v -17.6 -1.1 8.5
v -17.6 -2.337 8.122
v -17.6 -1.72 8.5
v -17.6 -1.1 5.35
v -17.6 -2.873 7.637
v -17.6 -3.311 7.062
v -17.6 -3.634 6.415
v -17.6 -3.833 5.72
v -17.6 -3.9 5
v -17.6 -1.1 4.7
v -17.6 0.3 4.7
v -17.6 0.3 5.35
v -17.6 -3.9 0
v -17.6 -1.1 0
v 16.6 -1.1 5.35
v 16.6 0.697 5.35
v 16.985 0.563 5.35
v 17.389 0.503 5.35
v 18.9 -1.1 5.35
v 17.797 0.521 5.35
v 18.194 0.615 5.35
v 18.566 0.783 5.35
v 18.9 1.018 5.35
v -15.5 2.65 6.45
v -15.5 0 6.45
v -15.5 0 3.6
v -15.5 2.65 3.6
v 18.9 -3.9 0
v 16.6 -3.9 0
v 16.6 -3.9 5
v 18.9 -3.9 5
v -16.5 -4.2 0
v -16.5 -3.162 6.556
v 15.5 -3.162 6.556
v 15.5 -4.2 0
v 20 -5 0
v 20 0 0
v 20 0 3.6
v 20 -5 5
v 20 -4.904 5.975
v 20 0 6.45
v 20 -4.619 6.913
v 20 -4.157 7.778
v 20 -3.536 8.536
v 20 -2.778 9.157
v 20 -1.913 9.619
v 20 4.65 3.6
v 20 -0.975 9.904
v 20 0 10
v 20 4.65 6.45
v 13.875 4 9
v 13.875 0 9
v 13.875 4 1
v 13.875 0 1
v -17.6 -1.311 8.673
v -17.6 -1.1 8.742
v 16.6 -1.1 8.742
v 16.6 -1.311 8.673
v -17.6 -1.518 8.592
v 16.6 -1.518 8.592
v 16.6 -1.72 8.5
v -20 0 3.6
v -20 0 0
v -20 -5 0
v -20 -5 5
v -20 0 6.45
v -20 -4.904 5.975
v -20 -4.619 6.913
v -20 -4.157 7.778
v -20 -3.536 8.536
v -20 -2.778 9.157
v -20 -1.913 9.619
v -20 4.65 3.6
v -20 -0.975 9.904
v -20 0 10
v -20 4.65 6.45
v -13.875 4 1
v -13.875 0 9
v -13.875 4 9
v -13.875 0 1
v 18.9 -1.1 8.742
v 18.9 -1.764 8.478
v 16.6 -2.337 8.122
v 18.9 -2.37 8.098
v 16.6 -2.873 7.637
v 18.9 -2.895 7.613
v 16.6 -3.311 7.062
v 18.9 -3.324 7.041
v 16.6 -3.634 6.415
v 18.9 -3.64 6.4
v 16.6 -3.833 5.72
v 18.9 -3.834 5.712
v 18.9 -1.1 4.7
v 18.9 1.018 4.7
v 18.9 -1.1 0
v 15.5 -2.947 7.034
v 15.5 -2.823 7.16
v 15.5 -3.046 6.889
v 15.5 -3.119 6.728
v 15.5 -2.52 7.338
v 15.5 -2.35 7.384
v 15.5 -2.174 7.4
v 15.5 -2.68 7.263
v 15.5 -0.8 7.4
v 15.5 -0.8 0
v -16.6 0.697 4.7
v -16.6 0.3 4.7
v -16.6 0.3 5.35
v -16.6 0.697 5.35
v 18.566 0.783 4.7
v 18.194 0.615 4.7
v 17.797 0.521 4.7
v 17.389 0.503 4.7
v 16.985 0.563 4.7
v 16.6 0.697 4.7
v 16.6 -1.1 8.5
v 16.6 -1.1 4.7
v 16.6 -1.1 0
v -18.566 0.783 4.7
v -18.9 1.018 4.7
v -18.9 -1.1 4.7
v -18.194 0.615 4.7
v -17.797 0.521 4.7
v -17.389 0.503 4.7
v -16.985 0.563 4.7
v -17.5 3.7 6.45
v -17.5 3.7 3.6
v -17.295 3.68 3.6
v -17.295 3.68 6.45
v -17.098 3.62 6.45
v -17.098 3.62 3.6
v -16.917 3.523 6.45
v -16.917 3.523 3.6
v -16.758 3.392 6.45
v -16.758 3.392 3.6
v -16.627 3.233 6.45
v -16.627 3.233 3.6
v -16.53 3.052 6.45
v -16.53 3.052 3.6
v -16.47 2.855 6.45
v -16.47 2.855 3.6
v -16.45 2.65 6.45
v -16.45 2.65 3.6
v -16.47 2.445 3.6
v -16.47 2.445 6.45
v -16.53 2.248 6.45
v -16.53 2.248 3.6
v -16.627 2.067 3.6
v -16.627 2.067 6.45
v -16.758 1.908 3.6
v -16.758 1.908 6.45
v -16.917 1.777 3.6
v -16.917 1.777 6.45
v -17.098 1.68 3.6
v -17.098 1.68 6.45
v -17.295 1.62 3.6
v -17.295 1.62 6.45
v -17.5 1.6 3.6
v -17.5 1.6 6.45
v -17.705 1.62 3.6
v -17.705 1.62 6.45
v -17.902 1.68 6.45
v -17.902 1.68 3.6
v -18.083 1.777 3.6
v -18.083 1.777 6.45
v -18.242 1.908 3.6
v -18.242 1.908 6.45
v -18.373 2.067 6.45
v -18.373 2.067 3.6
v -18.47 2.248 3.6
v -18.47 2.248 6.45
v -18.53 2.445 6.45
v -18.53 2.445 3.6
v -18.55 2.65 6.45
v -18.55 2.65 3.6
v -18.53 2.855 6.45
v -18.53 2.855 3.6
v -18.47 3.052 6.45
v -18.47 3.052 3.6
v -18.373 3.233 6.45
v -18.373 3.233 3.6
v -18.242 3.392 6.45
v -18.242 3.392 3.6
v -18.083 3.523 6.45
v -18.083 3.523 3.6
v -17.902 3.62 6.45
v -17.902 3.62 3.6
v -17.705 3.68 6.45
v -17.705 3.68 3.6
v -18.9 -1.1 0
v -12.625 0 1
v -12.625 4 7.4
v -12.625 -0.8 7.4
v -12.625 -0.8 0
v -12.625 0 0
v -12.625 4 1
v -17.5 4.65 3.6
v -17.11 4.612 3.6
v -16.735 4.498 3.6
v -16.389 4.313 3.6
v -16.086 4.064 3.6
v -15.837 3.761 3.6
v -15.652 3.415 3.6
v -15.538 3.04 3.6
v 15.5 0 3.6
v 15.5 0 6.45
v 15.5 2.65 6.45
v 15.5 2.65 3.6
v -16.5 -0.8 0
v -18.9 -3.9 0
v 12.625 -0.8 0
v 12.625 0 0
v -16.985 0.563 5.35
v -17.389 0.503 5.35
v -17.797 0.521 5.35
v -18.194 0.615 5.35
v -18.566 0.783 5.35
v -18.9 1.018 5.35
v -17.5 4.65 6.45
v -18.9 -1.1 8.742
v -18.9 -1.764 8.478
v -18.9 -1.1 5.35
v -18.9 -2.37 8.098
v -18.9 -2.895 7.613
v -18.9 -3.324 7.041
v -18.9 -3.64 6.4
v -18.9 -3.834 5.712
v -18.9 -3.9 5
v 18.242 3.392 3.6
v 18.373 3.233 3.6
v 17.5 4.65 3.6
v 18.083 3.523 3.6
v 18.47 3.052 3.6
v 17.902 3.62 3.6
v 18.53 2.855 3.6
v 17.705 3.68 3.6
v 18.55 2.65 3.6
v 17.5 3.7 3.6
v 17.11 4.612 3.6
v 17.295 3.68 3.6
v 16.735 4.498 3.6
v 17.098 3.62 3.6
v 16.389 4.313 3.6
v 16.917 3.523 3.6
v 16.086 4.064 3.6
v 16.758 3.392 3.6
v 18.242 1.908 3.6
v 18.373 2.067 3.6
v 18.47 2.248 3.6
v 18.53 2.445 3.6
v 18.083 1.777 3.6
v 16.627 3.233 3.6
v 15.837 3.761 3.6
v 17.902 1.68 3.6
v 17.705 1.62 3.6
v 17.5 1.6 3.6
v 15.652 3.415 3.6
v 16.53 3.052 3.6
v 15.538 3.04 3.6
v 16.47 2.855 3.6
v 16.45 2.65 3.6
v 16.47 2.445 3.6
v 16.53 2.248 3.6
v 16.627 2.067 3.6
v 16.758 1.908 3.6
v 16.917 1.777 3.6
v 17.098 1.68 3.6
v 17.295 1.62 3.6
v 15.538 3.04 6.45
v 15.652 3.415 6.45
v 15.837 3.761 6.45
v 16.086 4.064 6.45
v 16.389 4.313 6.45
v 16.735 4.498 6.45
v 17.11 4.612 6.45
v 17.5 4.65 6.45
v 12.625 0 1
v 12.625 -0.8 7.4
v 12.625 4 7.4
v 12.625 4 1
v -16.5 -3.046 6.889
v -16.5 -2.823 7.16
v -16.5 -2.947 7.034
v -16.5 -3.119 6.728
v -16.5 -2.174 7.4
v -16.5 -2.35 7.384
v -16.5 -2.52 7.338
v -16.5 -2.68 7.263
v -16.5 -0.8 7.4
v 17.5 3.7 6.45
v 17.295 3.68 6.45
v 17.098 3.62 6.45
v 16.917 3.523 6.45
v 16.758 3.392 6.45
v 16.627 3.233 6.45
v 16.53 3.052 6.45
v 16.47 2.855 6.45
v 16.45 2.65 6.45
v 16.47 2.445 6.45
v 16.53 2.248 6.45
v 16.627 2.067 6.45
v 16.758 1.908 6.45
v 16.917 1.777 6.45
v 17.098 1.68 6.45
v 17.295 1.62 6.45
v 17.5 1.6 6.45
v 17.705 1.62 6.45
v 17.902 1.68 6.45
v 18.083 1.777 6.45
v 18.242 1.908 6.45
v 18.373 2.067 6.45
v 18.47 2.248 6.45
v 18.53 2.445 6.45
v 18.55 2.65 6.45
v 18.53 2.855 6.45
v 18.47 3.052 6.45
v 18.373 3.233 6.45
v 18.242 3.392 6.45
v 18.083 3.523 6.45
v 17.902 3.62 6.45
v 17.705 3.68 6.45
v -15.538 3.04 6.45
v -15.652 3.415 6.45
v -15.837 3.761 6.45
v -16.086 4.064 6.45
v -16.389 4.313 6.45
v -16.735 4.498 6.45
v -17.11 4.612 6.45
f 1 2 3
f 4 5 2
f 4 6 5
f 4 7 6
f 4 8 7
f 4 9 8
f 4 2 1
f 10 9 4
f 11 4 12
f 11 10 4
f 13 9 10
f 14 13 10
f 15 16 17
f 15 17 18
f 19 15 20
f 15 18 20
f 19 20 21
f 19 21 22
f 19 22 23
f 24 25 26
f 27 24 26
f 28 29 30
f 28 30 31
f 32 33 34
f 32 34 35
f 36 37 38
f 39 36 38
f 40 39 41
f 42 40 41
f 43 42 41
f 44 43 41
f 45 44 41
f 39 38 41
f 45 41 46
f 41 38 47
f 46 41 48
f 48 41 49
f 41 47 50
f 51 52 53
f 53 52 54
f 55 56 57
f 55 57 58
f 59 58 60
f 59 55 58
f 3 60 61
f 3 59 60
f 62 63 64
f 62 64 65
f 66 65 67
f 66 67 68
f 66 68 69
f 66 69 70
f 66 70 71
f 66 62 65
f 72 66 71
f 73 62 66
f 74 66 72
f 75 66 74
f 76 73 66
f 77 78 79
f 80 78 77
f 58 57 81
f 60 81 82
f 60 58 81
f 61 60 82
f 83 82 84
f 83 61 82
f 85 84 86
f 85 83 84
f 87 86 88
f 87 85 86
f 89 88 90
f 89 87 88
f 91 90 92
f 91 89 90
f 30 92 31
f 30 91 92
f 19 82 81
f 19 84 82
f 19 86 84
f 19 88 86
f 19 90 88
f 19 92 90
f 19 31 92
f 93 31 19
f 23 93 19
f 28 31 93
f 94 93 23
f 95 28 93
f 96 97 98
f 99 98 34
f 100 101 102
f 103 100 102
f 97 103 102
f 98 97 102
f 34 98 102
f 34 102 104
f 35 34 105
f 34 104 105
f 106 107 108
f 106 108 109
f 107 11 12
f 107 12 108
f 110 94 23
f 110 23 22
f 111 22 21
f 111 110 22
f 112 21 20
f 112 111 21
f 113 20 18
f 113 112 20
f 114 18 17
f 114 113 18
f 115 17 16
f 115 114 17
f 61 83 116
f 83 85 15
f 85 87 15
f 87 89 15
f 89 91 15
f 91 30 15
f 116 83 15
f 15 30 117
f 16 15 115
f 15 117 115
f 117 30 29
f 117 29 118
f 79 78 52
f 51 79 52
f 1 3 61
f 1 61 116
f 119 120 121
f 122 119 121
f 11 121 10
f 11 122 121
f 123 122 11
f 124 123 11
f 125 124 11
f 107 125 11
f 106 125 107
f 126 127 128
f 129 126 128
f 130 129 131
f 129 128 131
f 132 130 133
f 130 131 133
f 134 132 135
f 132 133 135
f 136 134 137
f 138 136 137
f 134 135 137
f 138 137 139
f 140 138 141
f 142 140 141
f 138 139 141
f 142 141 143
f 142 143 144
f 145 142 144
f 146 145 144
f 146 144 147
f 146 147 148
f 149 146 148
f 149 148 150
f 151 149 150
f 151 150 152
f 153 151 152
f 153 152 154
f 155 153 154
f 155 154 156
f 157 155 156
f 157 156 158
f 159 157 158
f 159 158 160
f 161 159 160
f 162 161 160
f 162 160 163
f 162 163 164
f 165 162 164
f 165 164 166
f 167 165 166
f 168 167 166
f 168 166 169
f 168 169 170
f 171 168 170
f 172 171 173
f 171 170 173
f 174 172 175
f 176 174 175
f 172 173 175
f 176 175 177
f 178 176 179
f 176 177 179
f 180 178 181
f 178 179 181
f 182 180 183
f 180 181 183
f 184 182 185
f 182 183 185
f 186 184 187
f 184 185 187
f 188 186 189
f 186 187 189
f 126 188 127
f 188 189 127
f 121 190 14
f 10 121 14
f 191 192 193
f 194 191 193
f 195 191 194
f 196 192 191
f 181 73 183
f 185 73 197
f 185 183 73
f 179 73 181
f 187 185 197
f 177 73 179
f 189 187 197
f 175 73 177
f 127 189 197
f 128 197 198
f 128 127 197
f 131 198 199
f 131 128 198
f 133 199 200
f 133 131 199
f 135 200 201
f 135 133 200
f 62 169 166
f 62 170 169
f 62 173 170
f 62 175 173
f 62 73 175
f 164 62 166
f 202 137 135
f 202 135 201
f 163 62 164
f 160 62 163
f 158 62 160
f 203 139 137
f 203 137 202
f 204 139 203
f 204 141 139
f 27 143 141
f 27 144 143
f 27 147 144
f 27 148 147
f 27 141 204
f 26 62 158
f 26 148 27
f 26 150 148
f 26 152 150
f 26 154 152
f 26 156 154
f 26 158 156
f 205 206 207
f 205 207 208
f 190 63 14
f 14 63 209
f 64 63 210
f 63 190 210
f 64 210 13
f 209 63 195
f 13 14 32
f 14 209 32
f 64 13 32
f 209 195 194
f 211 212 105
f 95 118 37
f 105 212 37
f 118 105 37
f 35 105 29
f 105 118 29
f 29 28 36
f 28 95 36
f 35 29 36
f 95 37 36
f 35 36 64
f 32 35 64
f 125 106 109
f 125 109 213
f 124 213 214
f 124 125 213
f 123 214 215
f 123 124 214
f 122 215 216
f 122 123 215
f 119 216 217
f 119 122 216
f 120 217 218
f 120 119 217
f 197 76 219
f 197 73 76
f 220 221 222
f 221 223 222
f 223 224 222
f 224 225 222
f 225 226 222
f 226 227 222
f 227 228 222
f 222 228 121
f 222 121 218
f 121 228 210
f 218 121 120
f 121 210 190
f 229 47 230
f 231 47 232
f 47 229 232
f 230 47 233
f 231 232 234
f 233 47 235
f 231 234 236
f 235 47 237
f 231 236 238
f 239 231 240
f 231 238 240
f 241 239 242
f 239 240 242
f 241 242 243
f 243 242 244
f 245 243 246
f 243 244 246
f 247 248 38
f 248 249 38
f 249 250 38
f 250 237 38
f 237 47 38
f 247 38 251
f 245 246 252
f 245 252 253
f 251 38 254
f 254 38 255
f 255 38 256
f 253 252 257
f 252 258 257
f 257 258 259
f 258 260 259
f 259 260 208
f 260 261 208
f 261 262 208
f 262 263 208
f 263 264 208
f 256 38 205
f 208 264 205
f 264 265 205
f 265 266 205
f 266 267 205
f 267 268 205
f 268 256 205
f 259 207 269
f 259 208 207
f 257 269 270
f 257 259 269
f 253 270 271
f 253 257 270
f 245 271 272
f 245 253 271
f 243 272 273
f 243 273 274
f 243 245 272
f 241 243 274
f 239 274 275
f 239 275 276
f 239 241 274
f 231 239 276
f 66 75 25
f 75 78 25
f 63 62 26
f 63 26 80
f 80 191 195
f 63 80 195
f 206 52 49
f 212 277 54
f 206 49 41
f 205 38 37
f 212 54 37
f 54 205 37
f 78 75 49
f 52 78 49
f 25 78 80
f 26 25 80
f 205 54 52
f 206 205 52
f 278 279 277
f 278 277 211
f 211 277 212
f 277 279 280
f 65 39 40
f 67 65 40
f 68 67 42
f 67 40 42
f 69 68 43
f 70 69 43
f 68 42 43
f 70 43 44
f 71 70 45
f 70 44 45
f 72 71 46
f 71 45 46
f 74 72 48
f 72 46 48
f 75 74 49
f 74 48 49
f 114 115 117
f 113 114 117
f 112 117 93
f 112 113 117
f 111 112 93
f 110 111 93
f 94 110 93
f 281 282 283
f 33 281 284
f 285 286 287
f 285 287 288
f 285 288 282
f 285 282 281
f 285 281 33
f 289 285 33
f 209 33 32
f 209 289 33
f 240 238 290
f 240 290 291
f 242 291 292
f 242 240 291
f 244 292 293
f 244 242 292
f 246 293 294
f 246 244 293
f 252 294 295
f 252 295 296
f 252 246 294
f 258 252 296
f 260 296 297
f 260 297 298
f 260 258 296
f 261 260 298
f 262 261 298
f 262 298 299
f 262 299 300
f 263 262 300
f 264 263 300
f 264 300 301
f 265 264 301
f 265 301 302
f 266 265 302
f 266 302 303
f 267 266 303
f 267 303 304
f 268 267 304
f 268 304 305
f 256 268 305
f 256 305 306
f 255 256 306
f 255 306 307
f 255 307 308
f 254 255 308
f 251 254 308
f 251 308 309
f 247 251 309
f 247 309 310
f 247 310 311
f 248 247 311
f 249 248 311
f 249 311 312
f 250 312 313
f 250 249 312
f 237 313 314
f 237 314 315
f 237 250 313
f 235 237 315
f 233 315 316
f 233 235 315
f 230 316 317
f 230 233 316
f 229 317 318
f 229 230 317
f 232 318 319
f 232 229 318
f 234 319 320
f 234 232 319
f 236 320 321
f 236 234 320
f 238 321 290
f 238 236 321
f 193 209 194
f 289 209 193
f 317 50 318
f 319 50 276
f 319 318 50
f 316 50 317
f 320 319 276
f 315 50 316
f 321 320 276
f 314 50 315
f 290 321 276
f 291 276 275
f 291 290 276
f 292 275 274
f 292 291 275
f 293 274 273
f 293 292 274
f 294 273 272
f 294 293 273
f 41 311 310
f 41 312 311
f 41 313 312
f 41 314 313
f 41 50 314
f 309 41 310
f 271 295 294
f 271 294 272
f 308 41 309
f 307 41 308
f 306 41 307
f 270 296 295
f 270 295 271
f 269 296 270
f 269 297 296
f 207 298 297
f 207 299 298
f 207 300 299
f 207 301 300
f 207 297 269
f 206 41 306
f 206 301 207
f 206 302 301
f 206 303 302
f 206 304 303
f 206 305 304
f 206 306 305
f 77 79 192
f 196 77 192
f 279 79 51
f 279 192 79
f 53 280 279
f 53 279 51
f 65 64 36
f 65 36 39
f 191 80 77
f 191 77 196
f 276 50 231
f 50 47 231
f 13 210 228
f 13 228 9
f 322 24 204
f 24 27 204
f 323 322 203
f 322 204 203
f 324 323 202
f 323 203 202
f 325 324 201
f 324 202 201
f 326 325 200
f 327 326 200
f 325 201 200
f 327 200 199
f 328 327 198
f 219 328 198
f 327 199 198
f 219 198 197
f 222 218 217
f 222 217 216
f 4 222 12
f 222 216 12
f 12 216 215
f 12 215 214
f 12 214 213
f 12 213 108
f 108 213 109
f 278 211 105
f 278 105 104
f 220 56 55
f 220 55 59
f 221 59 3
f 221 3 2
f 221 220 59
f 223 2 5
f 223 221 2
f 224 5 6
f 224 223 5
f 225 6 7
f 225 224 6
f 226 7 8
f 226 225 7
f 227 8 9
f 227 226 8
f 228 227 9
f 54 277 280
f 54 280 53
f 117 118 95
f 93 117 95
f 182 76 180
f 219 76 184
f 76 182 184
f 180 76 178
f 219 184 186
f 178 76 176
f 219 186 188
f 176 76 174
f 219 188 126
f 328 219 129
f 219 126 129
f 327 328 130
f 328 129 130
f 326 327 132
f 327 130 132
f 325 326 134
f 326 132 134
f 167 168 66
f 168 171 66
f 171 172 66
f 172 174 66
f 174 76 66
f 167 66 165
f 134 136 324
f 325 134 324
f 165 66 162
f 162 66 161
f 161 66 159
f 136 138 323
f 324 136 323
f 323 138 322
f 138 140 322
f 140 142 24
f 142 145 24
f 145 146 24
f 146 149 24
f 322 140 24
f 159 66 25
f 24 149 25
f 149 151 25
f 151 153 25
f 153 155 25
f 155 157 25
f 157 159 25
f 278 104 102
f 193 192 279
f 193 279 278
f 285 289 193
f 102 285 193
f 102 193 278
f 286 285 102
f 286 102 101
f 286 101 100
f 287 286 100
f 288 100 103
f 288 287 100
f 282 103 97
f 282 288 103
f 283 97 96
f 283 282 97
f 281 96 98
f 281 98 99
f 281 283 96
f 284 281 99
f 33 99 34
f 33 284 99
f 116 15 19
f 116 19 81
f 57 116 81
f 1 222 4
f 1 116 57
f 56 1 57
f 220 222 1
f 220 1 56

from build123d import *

# Parameters (mm, degrees)
BOSS_EXTRUDE1_DEPTH     = 20
SKETCH2_W               = 27.75
SKETCH2_H               = 8
BOSS_EXTRUDE2_DEPTH     = 4
CUT_EXTRUDE1_DEPTH      = 12.625
CUT_EXTRUDE1_DEPTH_BACK = 12.625
SKETCH6_W               = 4.5
SKETCH6_H               = 2.85
BOSS_EXTRUDE3_DEPTH     = 4.65
FILLET1_R               = 2
CUT_EXTRUDE2_REACH      = 23.586
SKETCH7_R               = 1.05
FILLET1_OF_MIRROR1_R    = 2
CUT_EXTRUDE3_START      = -16.5
CUT_EXTRUDE3_DEPTH      = 32
SHELL1_OUTLINE_W        = 2.3
SHELL1_OUTLINE_H        = 2.8
SHELL1_OUTLINE_W_2      = 1.3
SHELL1_DEPTH            = 5
SHELL1_START            = 4.7
SHELL1_2_DEPTH          = 0.65
SHELL1_START_2          = 16.6
SHELL1_3_DEPTH          = 2.3
SHELL1_START_3          = -18.9
SHELL1_4_DEPTH          = 1.3
SHELL1_START_4          = -17.6
SHELL1_5_DEPTH          = 34.2


with BuildPart() as part:
    # Sketch1 → Boss-Extrude1 (new, symmetric)
    with BuildSketch(Plane(origin=(0, 0, 0), x_dir=(0, 0, -1), z_dir=(1, 0, 0))):
        with BuildLine():
            Line((-10, 0), (0, 0))
            Line((0, 0), (0, -5))
            Line((0, -5), (-5, -5))
            ThreePointArc((-5, -5), (-8.535533906, -3.535533906), (-10, 0))
        make_face()
    extrude(amount=BOSS_EXTRUDE1_DEPTH, both=True)

    # Sketch2 → Boss-Extrude2 (add)
    with BuildSketch(Plane(origin=(0, 0, 0), x_dir=(1, 0, 0), z_dir=(0, 1, 0))):
        with Locations((0, -5)):
            Rectangle(SKETCH2_W, SKETCH2_H)
    extrude(amount=BOSS_EXTRUDE2_DEPTH)

    # Sketch4 → Cut-Extrude1 (cut, two sides: drawn at the far end of the back side and taken through both)
    with BuildSketch(Plane(origin=(0, 0, 0), x_dir=(0, 0, -1), z_dir=(1, 0, 0)).offset(-CUT_EXTRUDE1_DEPTH_BACK)):
        Polygon((-1, -0.8), (0, -0.8), (0, 4), (-7.4, 4), (-7.4, -0.8), align=None)
        with BuildLine():
            Line((-6.556434465, -3.161562797), (0, -4.2))
            Line((0, -4.2), (0, -0.8))
            Line((0, -0.8), (-1, -0.8))
            Line((-1, -0.8), (-7.4, -0.8))
            Line((-7.4, -0.8), (-7.4, -2.173874456))
            ThreePointArc((-7.4, -2.173874456), (-7.160405966, -2.823322504), (-6.556434465, -3.161562797))
        make_face()
    extrude(amount=CUT_EXTRUDE1_DEPTH + CUT_EXTRUDE1_DEPTH_BACK, mode=Mode.SUBTRACT)

    # Sketch6 → Boss-Extrude3 (add)
    with BuildSketch(Plane(origin=(0, 0, 0), x_dir=(1, 0, 0), z_dir=(0, 1, 0))):
        with Locations((-17.75, -5.025)):
            Rectangle(SKETCH6_W, SKETCH6_H)
    boss_extrude3 = extrude(amount=BOSS_EXTRUDE3_DEPTH)

    # Fillet1
    fillet1_edges = [part.edges().sort_by_distance(p)[0] for p in [
        (-15.5, 4.65, 5.025),
    ]]
    fillet(fillet1_edges, radius=FILLET1_R)

    # Sketch7 → Cut-Extrude2 (cut, up to next)
    with BuildSketch(Plane(origin=(0, 0, 3.6), x_dir=(-1, 0, 0), z_dir=(0, 0, -1)), mode=Mode.PRIVATE) as cut_extrude2_sk1:
        with Locations(Location((17.5, 2.65, 0), (0, 0, 90))):
            Circle(SKETCH7_R)
    cut_extrude2_tool1 = extrude(cut_extrude2_sk1.sketch, amount=-CUT_EXTRUDE2_REACH, mode=Mode.PRIVATE) & part.part
    cut_extrude2 = cut_extrude2_tool1.solids().sort_by_distance((-17.5, 2.65, 3.6))[0]
    add(cut_extrude2, mode=Mode.SUBTRACT)

    # Mirror1: Boss-Extrude3, Cut-Extrude2 across plane
    add(boss_extrude3.mirror(Plane(origin=(0, 0, 0), x_dir=(0, 0, 1), z_dir=(1, 0, 0))))
    add(cut_extrude2.mirror(Plane(origin=(0, 0, 0), x_dir=(0, 0, 1), z_dir=(1, 0, 0))), mode=Mode.SUBTRACT)

    # Fillet1 of Mirror1
    fillet1_of_mirror1_edges = [part.edges().sort_by_distance(p)[0] for p in [
        (15.5, 4.65, 5.025),
    ]]
    fillet(fillet1_of_mirror1_edges, radius=FILLET1_OF_MIRROR1_R)

    # Sketch4<3> → Cut-Extrude3 (cut)
    with BuildSketch(Plane(origin=(0, 0, 0), x_dir=(0, 0, -1), z_dir=(1, 0, 0)).offset(CUT_EXTRUDE3_START)):
        with BuildLine():
            Line((-6.556434465, -3.161562797), (0, -4.2))
            Line((0, -4.2), (0, -0.8))
            Line((0, -0.8), (-1, -0.8))
            Line((-1, -0.8), (-7.4, -0.8))
            Line((-7.4, -0.8), (-7.4, -2.173874456))
            ThreePointArc((-7.4, -2.173874456), (-7.160405966, -2.823322504), (-6.556434465, -3.161562797))
        make_face()
    extrude(amount=CUT_EXTRUDE3_DEPTH, mode=Mode.SUBTRACT)

    # Shell1: read off the stored shape, not the designer's step
    # Shell1 outline → Shell1 (cut)
    with BuildSketch(Plane.XY):
        with Locations((17.75, -2.5)):
            Rectangle(SHELL1_OUTLINE_W, SHELL1_OUTLINE_H)
        with Locations((-18.25, -2.5)):
            Rectangle(SHELL1_OUTLINE_W_2, SHELL1_OUTLINE_H)
    extrude(amount=SHELL1_DEPTH, mode=Mode.SUBTRACT)

    # Shell1 2 outline → Shell1 2 (cut)
    with BuildSketch(Plane.XY.offset(SHELL1_START)):
        with BuildLine():
            Line((16.6, 0.697437581), (16.6, -1.1))
            Line((16.6, -1.1), (18.9, -1.1))
            Line((18.9, -1.1), (18.9, 1.018283113))
            ThreePointArc((18.9, 1.018283113), (17.797044549, 0.520618743), (16.6, 0.697437581))
        make_face()
        with BuildLine():
            Line((-16.6, 0.3), (-16.6, 0.697437581))
            ThreePointArc((-16.6, 0.697437581), (-17.797044549, 0.520618743), (-18.9, 1.018283113))
            Line((-18.9, 1.018283113), (-18.9, -1.1))
            Line((-18.9, -1.1), (-17.6, -1.1))
            Line((-17.6, -1.1), (-17.6, 0.3))
            Line((-17.6, 0.3), (-16.6, 0.3))
        make_face()
    extrude(amount=SHELL1_2_DEPTH, mode=Mode.SUBTRACT)

    # Shell1 3 outline → Shell1 3 (cut)
    with BuildSketch(Plane.YZ.offset(SHELL1_START_2)):
        with BuildLine():
            Line((-3.9, 5), (-1.1, 5))
            Line((-1.1, 5), (-1.1, 8.741657387))
            ThreePointArc((-1.1, 8.741657387), (-3.122498999, 7.336664289), (-3.9, 5))
        make_face()
    extrude(amount=SHELL1_3_DEPTH, mode=Mode.SUBTRACT)

    # Shell1 4 outline → Shell1 4 (cut)
    with BuildSketch(Plane.YZ.offset(SHELL1_START_3)):
        with BuildLine():
            Line((-3.9, 5), (-1.1, 5))
            Line((-1.1, 5), (-1.1, 8.741657387))
            ThreePointArc((-1.1, 8.741657387), (-3.122498999, 7.336664289), (-3.9, 5))
        make_face()
    extrude(amount=SHELL1_4_DEPTH, mode=Mode.SUBTRACT)

    # Shell1 5 outline → Shell1 5 (cut)
    with BuildSketch(Plane.YZ.offset(SHELL1_START_4)):
        with BuildLine():
            ThreePointArc((-1.1, 8.741657387), (-1.415399361, 8.63409475), (-1.720465053, 8.5))
            Line((-1.720465053, 8.5), (-1.1, 8.5))
            Line((-1.1, 8.5), (-1.1, 8.741657387))
        make_face()
    extrude(amount=SHELL1_5_DEPTH, mode=Mode.SUBTRACT)


solid = part.part
